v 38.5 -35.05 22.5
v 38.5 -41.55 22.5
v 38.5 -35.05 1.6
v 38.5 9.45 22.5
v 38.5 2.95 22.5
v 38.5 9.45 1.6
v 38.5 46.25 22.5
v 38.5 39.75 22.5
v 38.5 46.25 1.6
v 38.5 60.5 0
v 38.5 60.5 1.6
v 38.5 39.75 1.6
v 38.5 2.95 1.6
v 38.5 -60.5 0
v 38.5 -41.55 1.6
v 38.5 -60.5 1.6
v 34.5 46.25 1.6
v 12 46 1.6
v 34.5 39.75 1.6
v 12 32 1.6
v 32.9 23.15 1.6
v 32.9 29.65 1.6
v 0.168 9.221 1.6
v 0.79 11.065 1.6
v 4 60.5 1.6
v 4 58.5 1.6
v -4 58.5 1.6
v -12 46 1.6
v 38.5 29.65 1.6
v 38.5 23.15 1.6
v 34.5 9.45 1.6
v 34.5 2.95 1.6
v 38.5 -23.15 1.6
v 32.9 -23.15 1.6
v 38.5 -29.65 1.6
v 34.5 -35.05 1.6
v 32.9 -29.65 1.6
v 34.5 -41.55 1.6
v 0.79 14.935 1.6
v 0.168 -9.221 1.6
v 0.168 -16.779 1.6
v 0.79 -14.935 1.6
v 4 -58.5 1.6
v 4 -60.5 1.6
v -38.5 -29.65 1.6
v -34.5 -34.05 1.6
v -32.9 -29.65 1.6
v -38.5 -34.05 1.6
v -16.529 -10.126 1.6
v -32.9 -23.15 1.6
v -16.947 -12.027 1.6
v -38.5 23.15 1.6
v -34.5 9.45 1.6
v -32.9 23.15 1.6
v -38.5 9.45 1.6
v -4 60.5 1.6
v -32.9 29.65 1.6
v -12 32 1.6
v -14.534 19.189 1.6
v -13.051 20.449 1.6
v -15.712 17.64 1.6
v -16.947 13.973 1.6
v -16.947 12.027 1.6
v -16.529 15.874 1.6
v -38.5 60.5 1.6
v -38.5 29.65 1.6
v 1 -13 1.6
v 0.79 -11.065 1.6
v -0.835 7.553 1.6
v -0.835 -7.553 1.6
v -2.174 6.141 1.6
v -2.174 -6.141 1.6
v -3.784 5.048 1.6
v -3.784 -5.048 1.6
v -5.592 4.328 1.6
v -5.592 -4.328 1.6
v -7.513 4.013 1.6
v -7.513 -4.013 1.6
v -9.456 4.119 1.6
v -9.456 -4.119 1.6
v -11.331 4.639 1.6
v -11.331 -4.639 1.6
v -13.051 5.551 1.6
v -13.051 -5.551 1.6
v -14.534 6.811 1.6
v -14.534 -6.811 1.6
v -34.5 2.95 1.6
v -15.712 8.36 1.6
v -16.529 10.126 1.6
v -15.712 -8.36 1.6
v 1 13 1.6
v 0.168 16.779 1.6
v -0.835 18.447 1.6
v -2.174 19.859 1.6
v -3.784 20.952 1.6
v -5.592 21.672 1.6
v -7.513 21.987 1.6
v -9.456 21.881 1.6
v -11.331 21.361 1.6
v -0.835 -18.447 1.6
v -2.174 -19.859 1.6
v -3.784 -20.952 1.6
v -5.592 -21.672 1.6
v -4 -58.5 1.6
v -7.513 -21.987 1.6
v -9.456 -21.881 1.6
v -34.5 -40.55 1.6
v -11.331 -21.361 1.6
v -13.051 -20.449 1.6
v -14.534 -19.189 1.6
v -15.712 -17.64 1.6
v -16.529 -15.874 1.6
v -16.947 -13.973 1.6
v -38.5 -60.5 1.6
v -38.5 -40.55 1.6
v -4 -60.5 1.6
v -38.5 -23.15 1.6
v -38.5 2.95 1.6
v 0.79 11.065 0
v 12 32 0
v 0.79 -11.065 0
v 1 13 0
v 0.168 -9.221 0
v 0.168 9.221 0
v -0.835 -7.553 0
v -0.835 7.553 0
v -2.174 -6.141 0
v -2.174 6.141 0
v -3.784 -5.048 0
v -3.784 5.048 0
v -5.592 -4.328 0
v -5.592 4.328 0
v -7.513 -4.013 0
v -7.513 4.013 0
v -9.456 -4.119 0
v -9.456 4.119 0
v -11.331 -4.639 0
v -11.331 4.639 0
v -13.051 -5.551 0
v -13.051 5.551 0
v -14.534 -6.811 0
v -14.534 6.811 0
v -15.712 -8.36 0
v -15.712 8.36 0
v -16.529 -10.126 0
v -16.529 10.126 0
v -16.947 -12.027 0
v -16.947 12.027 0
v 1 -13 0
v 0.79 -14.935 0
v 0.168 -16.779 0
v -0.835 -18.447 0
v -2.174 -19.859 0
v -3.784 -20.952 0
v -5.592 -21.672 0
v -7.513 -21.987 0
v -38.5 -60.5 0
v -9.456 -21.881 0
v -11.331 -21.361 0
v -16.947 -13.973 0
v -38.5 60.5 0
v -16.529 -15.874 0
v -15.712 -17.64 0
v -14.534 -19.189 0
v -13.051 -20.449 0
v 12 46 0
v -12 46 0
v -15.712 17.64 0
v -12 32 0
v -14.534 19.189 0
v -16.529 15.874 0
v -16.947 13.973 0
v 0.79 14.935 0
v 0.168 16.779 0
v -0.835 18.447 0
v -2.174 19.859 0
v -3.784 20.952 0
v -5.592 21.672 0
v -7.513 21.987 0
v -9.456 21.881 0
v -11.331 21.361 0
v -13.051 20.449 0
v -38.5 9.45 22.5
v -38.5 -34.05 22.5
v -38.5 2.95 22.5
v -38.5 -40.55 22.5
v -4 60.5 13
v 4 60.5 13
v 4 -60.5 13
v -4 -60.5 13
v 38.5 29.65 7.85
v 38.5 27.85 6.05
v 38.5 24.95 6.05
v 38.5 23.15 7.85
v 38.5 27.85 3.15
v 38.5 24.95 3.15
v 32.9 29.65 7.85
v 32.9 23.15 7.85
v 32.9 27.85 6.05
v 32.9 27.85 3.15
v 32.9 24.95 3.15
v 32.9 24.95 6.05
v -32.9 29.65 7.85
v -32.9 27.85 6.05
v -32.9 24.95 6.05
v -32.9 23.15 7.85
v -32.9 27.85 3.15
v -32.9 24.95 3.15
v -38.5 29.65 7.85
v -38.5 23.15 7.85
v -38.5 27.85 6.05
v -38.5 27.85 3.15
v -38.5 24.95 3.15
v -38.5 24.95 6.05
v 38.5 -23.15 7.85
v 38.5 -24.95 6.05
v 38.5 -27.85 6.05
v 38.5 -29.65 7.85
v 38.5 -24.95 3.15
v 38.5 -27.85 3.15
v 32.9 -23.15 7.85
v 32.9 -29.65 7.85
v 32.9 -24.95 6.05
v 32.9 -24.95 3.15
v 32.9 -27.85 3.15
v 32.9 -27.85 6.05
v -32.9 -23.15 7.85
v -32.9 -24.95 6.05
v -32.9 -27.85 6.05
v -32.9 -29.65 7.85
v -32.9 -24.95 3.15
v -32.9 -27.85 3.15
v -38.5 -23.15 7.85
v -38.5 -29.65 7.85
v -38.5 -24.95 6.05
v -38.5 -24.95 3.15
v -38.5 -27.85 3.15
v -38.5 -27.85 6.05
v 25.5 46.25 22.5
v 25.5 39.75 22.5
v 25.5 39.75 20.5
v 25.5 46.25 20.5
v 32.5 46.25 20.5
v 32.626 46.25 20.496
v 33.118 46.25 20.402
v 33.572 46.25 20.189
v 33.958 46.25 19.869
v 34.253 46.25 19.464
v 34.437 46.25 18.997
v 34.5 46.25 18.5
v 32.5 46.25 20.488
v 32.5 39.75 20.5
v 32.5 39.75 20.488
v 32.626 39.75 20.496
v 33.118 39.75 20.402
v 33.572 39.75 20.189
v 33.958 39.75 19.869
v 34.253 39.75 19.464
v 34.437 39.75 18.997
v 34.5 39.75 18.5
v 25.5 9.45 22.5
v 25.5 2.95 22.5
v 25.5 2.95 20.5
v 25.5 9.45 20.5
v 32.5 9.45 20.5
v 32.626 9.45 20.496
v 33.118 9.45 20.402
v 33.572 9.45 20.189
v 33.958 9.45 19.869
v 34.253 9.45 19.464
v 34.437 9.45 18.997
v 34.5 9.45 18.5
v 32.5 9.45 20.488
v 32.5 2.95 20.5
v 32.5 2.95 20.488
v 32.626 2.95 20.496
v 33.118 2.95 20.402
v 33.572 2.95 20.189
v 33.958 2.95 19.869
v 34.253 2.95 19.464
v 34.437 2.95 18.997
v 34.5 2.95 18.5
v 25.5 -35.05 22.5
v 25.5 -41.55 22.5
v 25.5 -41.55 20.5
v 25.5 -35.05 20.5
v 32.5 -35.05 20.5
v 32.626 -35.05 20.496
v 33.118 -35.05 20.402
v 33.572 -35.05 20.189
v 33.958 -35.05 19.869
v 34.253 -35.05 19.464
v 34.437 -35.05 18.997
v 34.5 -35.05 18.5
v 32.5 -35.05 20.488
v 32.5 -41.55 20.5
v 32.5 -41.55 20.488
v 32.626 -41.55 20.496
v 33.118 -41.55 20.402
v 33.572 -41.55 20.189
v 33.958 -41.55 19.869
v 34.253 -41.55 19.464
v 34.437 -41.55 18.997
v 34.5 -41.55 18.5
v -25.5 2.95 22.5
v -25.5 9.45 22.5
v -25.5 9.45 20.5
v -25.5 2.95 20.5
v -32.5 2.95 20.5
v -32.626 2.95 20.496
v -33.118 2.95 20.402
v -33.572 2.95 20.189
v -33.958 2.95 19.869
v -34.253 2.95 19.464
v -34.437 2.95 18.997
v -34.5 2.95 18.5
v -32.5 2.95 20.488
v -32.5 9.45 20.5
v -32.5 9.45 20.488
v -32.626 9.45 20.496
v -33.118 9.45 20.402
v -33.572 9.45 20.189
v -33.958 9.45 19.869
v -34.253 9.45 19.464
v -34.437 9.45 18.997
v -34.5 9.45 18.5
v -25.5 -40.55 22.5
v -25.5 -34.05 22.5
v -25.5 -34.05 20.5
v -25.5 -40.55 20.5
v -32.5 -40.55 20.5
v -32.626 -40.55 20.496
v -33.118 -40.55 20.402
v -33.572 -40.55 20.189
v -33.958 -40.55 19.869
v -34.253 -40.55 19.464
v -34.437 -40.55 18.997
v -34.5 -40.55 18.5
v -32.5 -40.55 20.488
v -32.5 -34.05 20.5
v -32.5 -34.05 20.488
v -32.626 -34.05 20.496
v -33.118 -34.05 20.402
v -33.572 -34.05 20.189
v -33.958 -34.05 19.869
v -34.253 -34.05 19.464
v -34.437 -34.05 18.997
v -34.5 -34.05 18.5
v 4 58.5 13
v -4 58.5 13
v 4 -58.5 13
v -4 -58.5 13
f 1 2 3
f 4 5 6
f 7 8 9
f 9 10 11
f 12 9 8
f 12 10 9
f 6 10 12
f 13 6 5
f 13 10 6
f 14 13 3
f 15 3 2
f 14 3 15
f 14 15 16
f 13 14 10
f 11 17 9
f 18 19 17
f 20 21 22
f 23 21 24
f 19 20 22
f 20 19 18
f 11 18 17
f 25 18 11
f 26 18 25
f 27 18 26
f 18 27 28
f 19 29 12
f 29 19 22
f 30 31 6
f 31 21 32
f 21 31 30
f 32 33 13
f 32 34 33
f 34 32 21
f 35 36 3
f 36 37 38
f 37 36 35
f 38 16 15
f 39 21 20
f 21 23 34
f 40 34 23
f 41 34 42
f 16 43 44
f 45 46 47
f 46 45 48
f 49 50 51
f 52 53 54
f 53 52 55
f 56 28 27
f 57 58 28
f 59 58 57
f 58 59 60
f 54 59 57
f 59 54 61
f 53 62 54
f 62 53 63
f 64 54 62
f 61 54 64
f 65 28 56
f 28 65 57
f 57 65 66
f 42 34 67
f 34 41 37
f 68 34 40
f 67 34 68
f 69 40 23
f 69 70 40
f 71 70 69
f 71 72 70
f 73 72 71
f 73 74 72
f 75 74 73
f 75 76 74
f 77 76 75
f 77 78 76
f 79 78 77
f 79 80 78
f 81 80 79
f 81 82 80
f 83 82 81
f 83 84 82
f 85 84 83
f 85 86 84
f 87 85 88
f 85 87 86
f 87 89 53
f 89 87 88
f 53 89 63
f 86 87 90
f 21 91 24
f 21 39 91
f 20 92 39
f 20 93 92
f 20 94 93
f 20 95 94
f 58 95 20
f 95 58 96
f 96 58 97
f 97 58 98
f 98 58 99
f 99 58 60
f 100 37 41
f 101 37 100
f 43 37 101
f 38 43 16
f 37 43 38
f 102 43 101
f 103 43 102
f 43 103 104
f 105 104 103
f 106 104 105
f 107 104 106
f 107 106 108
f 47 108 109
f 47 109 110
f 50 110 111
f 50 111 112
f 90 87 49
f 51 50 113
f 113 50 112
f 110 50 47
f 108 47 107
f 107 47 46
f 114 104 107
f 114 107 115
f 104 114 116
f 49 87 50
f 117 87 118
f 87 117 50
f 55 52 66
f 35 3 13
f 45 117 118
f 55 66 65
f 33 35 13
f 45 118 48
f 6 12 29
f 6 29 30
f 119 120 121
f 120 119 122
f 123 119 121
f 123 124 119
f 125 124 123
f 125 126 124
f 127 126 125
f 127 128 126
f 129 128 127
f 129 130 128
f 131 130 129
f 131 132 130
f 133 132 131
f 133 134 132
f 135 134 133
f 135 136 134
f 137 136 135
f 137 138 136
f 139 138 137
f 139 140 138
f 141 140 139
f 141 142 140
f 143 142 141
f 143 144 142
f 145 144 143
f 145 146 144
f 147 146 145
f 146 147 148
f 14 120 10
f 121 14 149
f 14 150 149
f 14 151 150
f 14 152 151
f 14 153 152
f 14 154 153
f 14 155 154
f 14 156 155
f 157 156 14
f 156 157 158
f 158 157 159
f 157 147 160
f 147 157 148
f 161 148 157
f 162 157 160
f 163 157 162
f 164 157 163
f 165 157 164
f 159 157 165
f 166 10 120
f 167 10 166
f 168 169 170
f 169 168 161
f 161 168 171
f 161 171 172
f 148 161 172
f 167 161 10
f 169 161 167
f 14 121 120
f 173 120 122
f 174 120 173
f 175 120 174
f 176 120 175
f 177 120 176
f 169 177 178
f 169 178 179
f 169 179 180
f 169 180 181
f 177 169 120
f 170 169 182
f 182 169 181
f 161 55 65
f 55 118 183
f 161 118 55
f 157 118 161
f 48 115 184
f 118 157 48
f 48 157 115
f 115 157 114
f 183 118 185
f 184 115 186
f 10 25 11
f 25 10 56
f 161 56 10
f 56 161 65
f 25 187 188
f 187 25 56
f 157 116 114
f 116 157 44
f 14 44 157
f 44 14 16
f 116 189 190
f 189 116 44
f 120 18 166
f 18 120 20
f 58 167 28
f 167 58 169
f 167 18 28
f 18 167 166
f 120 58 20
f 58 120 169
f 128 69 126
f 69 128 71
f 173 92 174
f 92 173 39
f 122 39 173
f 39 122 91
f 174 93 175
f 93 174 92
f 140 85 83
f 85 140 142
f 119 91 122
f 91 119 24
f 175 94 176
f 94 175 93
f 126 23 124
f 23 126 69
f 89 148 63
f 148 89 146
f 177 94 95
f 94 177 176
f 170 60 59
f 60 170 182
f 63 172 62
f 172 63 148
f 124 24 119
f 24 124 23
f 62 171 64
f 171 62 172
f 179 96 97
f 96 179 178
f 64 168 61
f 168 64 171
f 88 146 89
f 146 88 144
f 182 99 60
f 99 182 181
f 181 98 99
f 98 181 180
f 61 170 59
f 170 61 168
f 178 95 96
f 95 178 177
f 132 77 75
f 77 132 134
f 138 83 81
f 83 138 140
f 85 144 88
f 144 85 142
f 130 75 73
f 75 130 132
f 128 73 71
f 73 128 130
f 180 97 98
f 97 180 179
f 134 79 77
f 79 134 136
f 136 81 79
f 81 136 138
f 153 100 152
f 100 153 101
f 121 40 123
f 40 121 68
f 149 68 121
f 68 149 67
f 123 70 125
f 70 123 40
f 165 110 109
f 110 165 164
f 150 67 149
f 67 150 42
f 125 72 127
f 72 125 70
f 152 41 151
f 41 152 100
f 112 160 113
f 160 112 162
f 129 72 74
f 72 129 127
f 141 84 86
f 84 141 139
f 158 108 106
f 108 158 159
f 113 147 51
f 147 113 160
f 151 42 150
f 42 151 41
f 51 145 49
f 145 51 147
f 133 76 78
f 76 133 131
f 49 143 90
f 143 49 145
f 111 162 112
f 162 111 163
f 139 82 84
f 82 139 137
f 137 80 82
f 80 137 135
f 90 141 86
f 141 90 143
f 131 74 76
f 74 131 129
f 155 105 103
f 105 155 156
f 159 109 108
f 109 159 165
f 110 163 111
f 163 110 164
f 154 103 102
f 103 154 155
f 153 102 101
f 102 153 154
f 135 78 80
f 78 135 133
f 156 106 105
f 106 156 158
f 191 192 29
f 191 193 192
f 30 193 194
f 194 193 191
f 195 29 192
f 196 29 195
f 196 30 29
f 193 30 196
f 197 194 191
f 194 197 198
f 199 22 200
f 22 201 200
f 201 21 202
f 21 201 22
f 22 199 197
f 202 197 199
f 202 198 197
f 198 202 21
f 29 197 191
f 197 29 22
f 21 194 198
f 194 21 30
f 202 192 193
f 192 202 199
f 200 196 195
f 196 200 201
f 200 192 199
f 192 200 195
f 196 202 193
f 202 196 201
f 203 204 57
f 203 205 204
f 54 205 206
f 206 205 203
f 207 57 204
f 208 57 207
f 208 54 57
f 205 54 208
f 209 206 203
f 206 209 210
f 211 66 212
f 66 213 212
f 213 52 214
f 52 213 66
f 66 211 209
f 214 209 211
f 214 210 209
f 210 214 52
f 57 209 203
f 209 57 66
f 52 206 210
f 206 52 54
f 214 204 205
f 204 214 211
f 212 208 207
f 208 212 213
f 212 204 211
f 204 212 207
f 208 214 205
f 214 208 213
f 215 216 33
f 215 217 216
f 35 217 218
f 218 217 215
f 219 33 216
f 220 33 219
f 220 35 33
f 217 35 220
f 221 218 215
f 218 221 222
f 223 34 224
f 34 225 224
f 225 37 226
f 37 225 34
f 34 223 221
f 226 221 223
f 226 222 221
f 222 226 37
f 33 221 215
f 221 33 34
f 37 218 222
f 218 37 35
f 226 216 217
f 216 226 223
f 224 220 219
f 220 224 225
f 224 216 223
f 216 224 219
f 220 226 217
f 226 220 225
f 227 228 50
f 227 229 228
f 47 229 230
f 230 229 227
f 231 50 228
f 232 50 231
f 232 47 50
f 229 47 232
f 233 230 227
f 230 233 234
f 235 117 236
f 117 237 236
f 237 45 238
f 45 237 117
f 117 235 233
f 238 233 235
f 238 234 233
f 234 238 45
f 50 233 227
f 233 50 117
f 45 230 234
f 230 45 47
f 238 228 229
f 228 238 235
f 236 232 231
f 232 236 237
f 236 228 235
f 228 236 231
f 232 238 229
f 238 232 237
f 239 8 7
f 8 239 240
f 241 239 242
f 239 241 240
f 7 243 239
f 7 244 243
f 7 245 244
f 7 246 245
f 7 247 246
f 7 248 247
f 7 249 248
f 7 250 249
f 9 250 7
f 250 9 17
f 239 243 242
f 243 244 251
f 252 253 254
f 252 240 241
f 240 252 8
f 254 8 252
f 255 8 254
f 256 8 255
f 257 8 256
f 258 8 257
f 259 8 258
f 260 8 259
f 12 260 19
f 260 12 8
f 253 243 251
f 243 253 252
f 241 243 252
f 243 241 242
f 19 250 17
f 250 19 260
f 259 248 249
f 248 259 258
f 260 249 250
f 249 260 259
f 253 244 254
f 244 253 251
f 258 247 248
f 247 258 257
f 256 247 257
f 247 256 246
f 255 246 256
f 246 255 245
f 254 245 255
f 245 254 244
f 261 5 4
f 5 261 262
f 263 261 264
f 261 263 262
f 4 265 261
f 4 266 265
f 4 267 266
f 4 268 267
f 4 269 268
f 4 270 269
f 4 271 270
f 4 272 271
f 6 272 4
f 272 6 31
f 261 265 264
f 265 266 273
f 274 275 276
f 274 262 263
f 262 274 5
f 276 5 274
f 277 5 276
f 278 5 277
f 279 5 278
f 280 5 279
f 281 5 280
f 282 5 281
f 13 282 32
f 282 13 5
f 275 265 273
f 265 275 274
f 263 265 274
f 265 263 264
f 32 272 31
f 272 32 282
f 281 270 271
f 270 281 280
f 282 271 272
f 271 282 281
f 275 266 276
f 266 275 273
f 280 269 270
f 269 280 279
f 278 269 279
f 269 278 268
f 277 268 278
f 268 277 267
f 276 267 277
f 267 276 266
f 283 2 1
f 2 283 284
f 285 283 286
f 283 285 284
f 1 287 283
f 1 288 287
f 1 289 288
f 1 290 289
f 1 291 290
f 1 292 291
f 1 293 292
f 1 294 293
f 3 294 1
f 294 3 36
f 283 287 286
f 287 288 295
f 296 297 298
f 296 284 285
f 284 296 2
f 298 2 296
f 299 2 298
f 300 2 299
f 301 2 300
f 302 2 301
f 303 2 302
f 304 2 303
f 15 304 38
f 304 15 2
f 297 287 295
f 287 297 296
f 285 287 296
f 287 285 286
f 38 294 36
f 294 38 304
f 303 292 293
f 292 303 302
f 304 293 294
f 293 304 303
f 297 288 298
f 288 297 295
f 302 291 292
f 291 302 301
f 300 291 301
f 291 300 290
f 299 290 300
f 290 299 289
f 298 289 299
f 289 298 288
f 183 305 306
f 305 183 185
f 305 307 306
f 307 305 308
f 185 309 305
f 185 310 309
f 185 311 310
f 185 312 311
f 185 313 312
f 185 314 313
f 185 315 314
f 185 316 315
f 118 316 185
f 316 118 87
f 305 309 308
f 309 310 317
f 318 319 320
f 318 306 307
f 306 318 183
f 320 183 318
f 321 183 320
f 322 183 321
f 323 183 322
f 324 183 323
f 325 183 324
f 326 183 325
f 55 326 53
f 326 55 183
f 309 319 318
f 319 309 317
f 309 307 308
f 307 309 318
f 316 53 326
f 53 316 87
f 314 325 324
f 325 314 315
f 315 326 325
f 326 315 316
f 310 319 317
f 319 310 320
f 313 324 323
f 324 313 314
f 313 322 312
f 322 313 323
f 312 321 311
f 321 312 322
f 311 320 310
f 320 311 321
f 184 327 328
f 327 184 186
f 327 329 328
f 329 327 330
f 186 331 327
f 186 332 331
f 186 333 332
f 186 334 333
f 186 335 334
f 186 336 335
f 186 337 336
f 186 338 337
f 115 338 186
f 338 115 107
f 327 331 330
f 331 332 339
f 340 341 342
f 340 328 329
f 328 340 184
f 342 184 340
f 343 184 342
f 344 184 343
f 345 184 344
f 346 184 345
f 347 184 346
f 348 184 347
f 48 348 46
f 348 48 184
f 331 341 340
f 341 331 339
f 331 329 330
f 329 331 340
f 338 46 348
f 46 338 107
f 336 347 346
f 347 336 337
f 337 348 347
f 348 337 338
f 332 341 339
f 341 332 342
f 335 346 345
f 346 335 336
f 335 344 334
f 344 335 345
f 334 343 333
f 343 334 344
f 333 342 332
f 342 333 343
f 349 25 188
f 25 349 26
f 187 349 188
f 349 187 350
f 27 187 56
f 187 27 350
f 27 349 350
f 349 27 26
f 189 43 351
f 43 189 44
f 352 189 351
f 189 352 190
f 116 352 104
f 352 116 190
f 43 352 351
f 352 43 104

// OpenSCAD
//color("Blue") import("body_panel_top.stl");
//color("Blue") import("body_panel_front.stl");
//color("Blue") import("body_panel_left.stl");
//translate(v = [0,-2,0]) color("Green") import("body_riser_NH_v2.stl");
//translate(v = [(overall_width/2)+5, 52, 90]) rotate(a = [180,90,0]) color("Red") import("Arduino_Mega_8mm_Mount001.stl");

// Phone Dimensions
// Current dimenensions for the Kyocera Hydro
// Original Archos 28 settings shown after the 
// comment on each line
phone_length = 115; // 101 115
phone_width = 62; // 53 62
phone_depth = 18; // 10 13  Be sure to include space (~5mm) for the distance sensor
phone_back_radius = 2; // 4
cutout_height = 14; // 58
cutout_width = 24; // 42
cutout_vertical_offset = 39; // 14
hood_mount = false; // false

// Computed Dimensions
overall_width = phone_width + 15;
overall_length = phone_length + 6;
mount_width = (overall_width/2) - 2.8;
bracket_width = (overall_width/2) - 6.5;

// Full body
//translate(v = [-(overall_width/2), 0, (overall_width/2)]) rotate(a = [0,90,0]) body_panel_front();
//translate(v = [0, (overall_length/2)+1.6, (overall_width/2)]) rotate(a = [0,90,-90]) body_panel_left();
//translate(v = [0, -(overall_length/2)-1.6, (overall_width/2)]) rotate(a = [0,90,90]) body_panel_right();
//translate(v = [0,0,-3.8]) body_panel_bottom();
//translate(v = [(overall_width/2), 0, (overall_width/2)]) rotate(a = [0,-90,0]) body_panel_back();
//translate(v = [0,0,overall_width+3.8]) rotate(a = [180,0,0]) body_panel_top();


// To Print
body_panel_front();
//body_panel_left();
//body_panel_right();
//body_panel_bottom();
//body_panel_back();
//body_panel_top();

module body_panel_bottom() {
	union() {
		difference() {
			translate(v = [0,0,1.8]) cube(size = [overall_width,overall_length+3.2,4], center = true);

			translate(v = [(overall_width/2)-4.8,26.4,0]) cube(size = [2.9,2.9,12], center = true);
			translate(v = [-(overall_width/2)+4.8,26.4,0]) cube(size = [2.9,2.9,12], center = true);
			translate(v = [(overall_width/2)-4.8,-26.4,0]) cube(size = [2.9,2.9,12], center = true);
			translate(v = [-(overall_width/2)+4.8,-26.4,0]) cube(size = [2.9,2.9,12], center = true);


			translate(v = [16.5,(overall_length/2)-3.2,0]) cube(size = [2.9,2.9,12], center = true);
			translate(v = [-19.6,(overall_length/2)-3.2,0]) cube(size = [2.9,2.9,12], center = true);
			translate(v = [16.5,-(overall_length/2)+3.2,0]) cube(size = [2.9,2.9,12], center = true);
			translate(v = [-19.6,-(overall_length/2)+3.2,0]) cube(size = [2.9,2.9,12], center = true);

			translate(v = [26.4,12.7,0]) cube(size = [2.9,2.9,12], center = true);
			translate(v = [26.4,-12.7,0]) cube(size = [2.9,2.9,12], center = true);
			translate(v = [-26.4,12.7,0]) cube(size = [2.9,2.9,12], center = true);
			translate(v = [-26.4,-12.7,0]) cube(size = [2.9,2.9,12], center = true);
			translate(v = [12.6,0,0]) cube(size = [2.9,2.9,12], center = true);
			translate(v = [-12.8,0,0]) cube(size = [2.9,2.9,12], center = true);

			translate(v = [0,38,4.6]) cube(size = [overall_width-10,14,6], center = true);
			translate(v = [0,-38,4.6]) cube(size = [overall_width-10,14,6], center = true);
			translate(v = [0,22,4.6]) cube(size = [overall_width-36,26,6], center = true);
			translate(v = [0,-22,4.6]) cube(size = [overall_width-36,26,6], center = true);
		}

	}	
}

module body_panel_top() {
	union() {
		difference() {
			translate(v = [0,0,1.8]) cube(size = [overall_width,overall_length+3.2,4], center = true);

			translate(v = [(overall_width/2)-4.8,26.4,0]) cube(size = [2.9,2.9,12], center = true);
			translate(v = [-(overall_width/2)+4.8,26.4,0]) cube(size = [2.9,2.9,12], center = true);
			translate(v = [(overall_width/2)-4.8,-26.4,0]) cube(size = [2.9,2.9,12], center = true);
			translate(v = [-(overall_width/2)+4.8,-26.4,0]) cube(size = [2.9,2.9,12], center = true);


			translate(v = [16.5,(overall_length/2)-3.2,0]) cube(size = [2.9,2.9,12], center = true);
			translate(v = [-19.6,(overall_length/2)-3.2,0]) cube(size = [2.9,2.9,12], center = true);
			translate(v = [16.5,-(overall_length/2)+3.2,0]) cube(size = [2.9,2.9,12], center = true);
			translate(v = [-19.6,-(overall_length/2)+3.2,0]) cube(size = [2.9,2.9,12], center = true);

			translate(v = [0,38,4.6]) cube(size = [overall_width-10,14,6], center = true);
			translate(v = [0,-38,4.6]) cube(size = [overall_width-10,14,6], center = true);
			translate(v = [0,0,4.6]) cube(size = [overall_width-10,44,6], center = true);
		}
	}	
}

module body_panel_left() {
	union() {
		difference() {
			translate(v = [0,0,.8]) cube(size = [overall_width,overall_width,1.6], center = true);
			translate(v = [(overall_width/2)-26,-(overall_width/2)+6,0]) cube(size = [18,16,4],center = true);
		}

		// Screw Mounts
		translate(v = [mount_width,18.5,4.6]) screw_mount();
		translate(v = [-mount_width,18.5,4.6]) screw_mount();
		translate(v = [mount_width,-17.5,4.6]) screw_mount();
		translate(v = [-mount_width,-17.5,4.6]) screw_mount();

	}
}

module body_panel_right() {
	union() {
		difference() {
			translate(v = [0,0,.8]) cube(size = [overall_width,overall_width,1.6], center = true);
			translate(v = [0,6xx,-3]) cylinder(r = 9.5, h = 8);
			translate(v = [-4,-28,0]) cube(size = [50,12,8], center = true);
		}

		// Screw Mounts
		translate(v = [mount_width,18.5,4.6]) screw_mount();
		translate(v = [-mount_width,18.5,4.6]) screw_mount();
		translate(v = [mount_width,-17.5,4.6]) screw_mount();
		translate(v = [-mount_width,-17.5,4.6]) screw_mount();

	}
}


module body_panel_front() {
	union() {
		difference() {
			translate(v = [0,0,.8]) cube(size = [overall_width,overall_length,1.6], center = true);
			translate(v = [0,cutout_vertical_offset,0]) cube(size = [cutout_width,cutout_height,4], center = true);
			if(hood_mount == true) {
				translate(v = [(cutout_width/2) + 6,cutout_vertical_offset,0]) cube(size = [2.9,2.9,4], center = true);
				translate(v = [-((cutout_width/2) + 6),cutout_vertical_offset,0]) cube(size = [2.9,2.9,4], center = true);
				translate(v = [0,cutout_vertical_offset-(cutout_height/2)-6,0]) cube(size = [2.9,2.9,4], center = true);
			}

			// Distance Sensor
			translate(v = [-8,13,-3]) cylinder(r = 9, h = 8);
			translate(v = [-8,-13,-3]) cylinder(r = 9, h = 8);
		}

		// Extra secure mount on top and bottom
		translate(v = [0,(overall_length/2)-1,phone_depth/2-2.5]) cube(size = [8,2,phone_depth-5], center = true);
		translate(v = [0,-(overall_length/2)+1,phone_depth/2-2.5]) cube(size = [8,2,phone_depth-5], center = true);

		// Screw Mounts
		translate(v = [mount_width,26.4,4.6]) screw_mount();
		translate(v = [-mount_width,26.4,4.6]) screw_mount();
		translate(v = [mount_width,-26.4,4.6]) screw_mount();
		translate(v = [-mount_width,-26.4,4.6]) screw_mount();

		// Phone Brackets
		translate(v = [bracket_width,43,(phone_depth/2)+2.5]) phone_bracket();
		translate(v = [bracket_width,6.2,(phone_depth/2)+2.5]) phone_bracket();
		translate(v = [bracket_width,-38.3,(phone_depth/2)+2.5]) phone_bracket();
		translate(v = [-bracket_width,6.2,(phone_depth/2)+2.5]) rotate(a = [0,0,180]) phone_bracket();
		translate(v = [-bracket_width,-37.3,(phone_depth/2)+2.5]) rotate(a = [0,0,180]) phone_bracket();
	}
}

module body_panel_back() {
	union() {
		difference() {
			translate(v = [0,0,.8]) cube(size = [overall_width,overall_length,1.6], center = true);
			translate(v = [25.2,41.3,-3]) cylinder(r = 2, h = 10);
			translate(v = [25.2,-41.3,-3]) cylinder(r = 2, h = 10);
			translate(v = [-22.7,-40.3,-3]) cylinder(r = 2, h = 10);
			translate(v = [-22.7,34.8,-3]) cylinder(r = 2, h = 10);
		}

		// Screw Mounts
		translate(v = [mount_width,26.4,4.6]) screw_mount();
		translate(v = [-mount_width,26.4,4.6]) screw_mount();
		translate(v = [mount_width,-26.4,4.6]) screw_mount();
		translate(v = [-mount_width,-26.4,4.6]) screw_mount();

		// Arduino Mounts
		translate(v = [25.2,41.3,1]) arduino_riser();
		translate(v = [25.2,-41.3,1]) arduino_riser();
		translate(v = [-22.7,-40.3,1]) arduino_riser();
		translate(v = [-22.7,34.8,1]) arduino_riser();

	}
}


module screw_mount() {
	difference() {
		cube(size = [5.6,6.5,6.5], center = true);
		cube(size = [6,2.9,2.9], center = true);
	}
}

module phone_bracket() {
	difference() {
		cube(size = [13,6.5,phone_depth + 4], center = true);
		translate(v = [-4-phone_back_radius,0,-2]) cube(size = [13,7.5,phone_depth+4], center = true);
		translate(v = [-4,0,-2-phone_back_radius]) cube(size = [13,7.5,phone_depth+4], center = true);
		translate(v = [2.5-phone_back_radius,0,(phone_depth/2)-phone_back_radius], $fn=25) rotate(a = [90,0,0]) cylinder(r = phone_back_radius, h = 7.5, center = true);
	}
}

// Arduino Mount Riser
module arduino_riser() {
	difference() {
		cylinder(r = 4, h = 5);
		translate(v = [0,0,-3]) cylinder(r = 2, h = 10);
	}
}
